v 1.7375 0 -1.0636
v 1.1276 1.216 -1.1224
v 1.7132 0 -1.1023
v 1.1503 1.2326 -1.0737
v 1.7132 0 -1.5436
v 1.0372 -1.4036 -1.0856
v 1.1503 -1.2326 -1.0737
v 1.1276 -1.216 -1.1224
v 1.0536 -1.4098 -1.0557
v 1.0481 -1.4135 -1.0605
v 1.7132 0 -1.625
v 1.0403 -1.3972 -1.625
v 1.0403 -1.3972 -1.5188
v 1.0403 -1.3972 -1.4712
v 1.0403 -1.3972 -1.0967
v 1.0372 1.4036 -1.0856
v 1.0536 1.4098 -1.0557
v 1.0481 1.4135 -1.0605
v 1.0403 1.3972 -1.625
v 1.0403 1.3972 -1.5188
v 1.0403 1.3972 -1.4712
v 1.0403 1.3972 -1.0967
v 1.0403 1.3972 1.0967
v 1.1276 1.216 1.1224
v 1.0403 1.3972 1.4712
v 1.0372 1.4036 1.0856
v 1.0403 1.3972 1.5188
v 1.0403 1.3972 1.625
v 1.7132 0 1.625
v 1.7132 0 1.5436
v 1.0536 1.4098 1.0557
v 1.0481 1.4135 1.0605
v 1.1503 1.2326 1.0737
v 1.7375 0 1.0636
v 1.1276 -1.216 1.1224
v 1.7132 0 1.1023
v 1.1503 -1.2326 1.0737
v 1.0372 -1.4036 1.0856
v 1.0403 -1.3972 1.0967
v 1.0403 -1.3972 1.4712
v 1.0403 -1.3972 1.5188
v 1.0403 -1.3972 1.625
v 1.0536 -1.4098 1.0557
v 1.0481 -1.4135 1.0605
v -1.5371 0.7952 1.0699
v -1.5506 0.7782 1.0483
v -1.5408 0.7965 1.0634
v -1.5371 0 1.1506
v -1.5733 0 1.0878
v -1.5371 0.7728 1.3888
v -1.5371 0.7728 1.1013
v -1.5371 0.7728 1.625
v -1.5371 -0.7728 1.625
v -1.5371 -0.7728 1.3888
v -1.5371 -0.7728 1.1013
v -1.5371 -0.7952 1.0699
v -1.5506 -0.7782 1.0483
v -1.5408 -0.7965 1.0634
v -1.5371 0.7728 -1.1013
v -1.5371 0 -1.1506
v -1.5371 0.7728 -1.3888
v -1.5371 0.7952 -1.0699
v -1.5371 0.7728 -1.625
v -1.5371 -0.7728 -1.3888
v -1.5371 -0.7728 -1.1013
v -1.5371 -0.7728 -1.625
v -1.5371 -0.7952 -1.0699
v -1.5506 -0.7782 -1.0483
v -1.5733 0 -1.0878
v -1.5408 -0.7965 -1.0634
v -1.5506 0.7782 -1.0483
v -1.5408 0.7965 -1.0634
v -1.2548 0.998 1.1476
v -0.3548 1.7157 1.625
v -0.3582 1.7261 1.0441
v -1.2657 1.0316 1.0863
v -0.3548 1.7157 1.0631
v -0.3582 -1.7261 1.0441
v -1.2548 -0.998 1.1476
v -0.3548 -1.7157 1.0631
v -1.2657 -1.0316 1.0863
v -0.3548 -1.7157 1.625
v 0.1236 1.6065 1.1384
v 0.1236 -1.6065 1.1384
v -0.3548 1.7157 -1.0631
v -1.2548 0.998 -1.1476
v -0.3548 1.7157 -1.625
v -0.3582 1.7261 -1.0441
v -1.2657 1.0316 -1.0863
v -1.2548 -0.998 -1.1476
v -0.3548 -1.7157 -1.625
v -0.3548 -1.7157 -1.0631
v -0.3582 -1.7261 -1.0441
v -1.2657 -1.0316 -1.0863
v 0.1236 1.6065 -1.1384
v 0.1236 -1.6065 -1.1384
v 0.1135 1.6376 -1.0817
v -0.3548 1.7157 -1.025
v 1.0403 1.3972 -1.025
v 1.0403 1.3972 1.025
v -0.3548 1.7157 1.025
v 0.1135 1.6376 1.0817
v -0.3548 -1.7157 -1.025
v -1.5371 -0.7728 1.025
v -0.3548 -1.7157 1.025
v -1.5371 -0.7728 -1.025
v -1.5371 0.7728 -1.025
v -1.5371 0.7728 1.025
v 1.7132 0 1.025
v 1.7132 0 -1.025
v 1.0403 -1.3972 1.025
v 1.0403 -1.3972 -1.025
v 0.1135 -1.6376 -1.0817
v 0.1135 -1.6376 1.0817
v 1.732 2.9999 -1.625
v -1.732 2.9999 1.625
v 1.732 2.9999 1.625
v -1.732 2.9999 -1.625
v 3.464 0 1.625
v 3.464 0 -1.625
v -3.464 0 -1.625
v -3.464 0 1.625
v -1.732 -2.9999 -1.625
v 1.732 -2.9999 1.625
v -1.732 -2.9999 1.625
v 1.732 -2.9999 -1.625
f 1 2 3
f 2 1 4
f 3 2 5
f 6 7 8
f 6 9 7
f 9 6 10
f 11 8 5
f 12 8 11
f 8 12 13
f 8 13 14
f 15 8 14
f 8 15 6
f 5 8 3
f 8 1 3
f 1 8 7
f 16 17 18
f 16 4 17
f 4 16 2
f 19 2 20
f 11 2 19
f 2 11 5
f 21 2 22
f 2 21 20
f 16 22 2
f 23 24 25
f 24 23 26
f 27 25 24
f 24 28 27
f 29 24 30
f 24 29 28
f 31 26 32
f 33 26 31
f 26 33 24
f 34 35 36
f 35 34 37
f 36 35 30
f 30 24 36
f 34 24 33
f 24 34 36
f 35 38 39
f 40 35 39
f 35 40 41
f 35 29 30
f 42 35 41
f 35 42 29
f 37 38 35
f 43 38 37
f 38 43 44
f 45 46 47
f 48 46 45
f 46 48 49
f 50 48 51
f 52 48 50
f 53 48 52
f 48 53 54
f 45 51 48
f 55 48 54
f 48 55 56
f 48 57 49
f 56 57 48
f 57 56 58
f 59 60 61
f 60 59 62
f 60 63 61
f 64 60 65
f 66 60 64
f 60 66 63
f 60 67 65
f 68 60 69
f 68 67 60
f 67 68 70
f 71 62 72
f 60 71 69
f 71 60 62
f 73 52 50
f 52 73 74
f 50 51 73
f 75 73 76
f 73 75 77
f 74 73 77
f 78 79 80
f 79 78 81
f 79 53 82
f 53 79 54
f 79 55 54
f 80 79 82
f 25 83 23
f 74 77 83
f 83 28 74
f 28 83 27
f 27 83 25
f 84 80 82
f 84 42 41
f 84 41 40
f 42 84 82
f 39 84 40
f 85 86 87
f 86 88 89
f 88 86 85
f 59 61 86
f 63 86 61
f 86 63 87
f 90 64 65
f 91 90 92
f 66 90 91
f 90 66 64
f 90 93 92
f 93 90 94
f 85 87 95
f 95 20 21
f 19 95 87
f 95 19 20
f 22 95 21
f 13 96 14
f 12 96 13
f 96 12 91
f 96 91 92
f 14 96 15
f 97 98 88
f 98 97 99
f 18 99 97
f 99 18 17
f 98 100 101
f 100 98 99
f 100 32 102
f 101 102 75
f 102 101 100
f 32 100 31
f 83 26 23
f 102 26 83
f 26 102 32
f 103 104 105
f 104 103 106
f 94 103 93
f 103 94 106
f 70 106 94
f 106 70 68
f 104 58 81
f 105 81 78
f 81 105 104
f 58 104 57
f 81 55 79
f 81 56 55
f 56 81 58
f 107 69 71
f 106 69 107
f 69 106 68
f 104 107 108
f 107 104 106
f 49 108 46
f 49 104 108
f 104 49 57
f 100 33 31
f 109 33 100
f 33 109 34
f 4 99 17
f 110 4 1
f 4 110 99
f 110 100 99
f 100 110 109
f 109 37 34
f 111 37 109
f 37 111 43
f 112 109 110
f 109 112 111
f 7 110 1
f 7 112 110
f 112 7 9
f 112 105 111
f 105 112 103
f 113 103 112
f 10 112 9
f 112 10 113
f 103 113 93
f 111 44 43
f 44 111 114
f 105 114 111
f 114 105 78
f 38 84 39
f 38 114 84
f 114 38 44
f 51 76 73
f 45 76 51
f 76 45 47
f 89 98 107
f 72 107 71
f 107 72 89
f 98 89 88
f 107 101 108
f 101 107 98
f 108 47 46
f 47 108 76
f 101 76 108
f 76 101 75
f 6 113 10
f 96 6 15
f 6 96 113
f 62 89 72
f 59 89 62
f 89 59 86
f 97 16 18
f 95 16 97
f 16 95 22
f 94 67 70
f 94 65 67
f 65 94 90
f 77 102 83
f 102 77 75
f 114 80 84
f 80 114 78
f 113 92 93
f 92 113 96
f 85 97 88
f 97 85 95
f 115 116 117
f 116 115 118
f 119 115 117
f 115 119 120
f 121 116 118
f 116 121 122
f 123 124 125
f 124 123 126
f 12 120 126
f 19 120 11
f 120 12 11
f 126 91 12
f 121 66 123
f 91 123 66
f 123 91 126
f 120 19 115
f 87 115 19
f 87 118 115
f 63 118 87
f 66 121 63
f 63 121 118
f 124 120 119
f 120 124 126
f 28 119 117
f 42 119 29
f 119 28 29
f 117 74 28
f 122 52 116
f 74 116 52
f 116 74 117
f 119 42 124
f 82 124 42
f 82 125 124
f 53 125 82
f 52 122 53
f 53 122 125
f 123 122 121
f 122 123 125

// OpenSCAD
// Parameters
thickness = 3.25; //[1.6:6.5:0.05]
hex_af = 6.0; //[3.0:12.0:0.1]
screw_d = 4.0; //[2.0:8.0:0.1]
hole_clearance_d = 4.3; //[4.0:5.5:0.05]
body_len = 12.0; //[6.0:24.0:0.5]
body_w = 8.0; //[4.0:16.0:0.5]
t_head_w = 8.0; //[4.0:16.0:0.5]
t_neck_w = 5.0; //[2.5:10.0:0.5]
t_head_len = 12.0; //[6.0:24.0:0.5]
t_neck_len = 8.0; //[4.0:16.0:0.5]
chamfer = 0.3; //[0.1:1.0:0.05]
overlap = 0.8; //[0.5:2.0:0.1]
hex_R = 3.464; //[1.732:6.928:0.001]
serration_depth = 0.3; //[0.1:0.8:0.05]
serration_pitch = 1.2; //[0.6:2.4:0.1]
ball_d = 2.0; //[1.0:4.0:0.1]
ball_dimple_depth = 0.6; //[0.2:1.5:0.05]
fillet_r = 0.4; //[0.2:1.2:0.05]

// Hex profile across flats
module hex_profile_across_flats() {
  linear_extrude(height=thickness, center=true) {
    polygon(points=[
      [hex_R, 0],
      [hex_R/2, hex_R*sqrt(3)/2],
      [-hex_R/2, hex_R*sqrt(3)/2],
      [-hex_R, 0],
      [-hex_R/2, -hex_R*sqrt(3)/2],
      [hex_R/2, -hex_R*sqrt(3)/2]
    ]);
  }
}

// T-nut head block
module t_nut_head_block() {
  cube([t_head_len, t_head_w, thickness], center=true);
}

// T-nut neck block
module t_nut_neck_block() {
  cube([t_neck_len, t_neck_w, thickness], center=true);
}

// Central screw hole
module central_screw_hole() {
  cylinder(r=hole_clearance_d/2, h=thickness + 2*overlap, center=true);
}

// Lead-in chamfer cutter
module lead_in_chamfer_cutter_top() {
  translate([0, 0, thickness/2 - chamfer])
    cylinder(r1=hole_clearance_d/2 + chamfer, r2=0, h=2*chamfer, center=true);
}

module lead_in_chamfer_cutter_bottom() {
  translate([0, 0, -thickness/2 + chamfer])
    rotate([180, 0, 0])
    cylinder(r1=hole_clearance_d/2 + chamfer, r2=0, h=2*chamfer, center=true);
}

// Serration notch unit
module serration_notch_unit() {
  cube([serration_pitch/2, serration_depth, thickness + 2*overlap], center=true);
}

// Spring ball dimple cutter
module spring_ball_dimple_cutter() {
  translate([t_head_len/2 - ball_d/2, 0, thickness/2 - ball_dimple_depth])
    sphere(r=ball_d/2, center=true);
}

// Engraved size marking
module engraved_size_marking() {
  translate([0, 0, thickness/2 - chamfer/2])
    cube([hex_af/2, hex_af/4, chamfer], center=true);
}

// Edge fillet sphere
module edge_fillet_sphere() {
  sphere(r=fillet_r, center=true);
}

// Assemble T-nut
module t_nut_main_body() {
  difference() {
    intersection() {
      minkowski() {
        difference() {
          difference() {
            difference() {
              difference() {
                intersection() {
                  union() {
                    t_nut_head_block();
                    t_nut_neck_block();
                  }
                  hex_profile_across_flats();
                }
                spring_ball_dimple_cutter();
              }
              central_screw_hole();
              union() {
                lead_in_chamfer_cutter_top();
                lead_in_chamfer_cutter_bottom();
              }
            }
            union() {
              for (i = [1:5]) {
                translate([-t_head_len/2 + serration_pitch*i, t_head_w/2 - serration_depth/2, 0])
                  serration_notch_unit();
                translate([-t_head_len/2 + serration_pitch*i, -t_head_w/2 + serration_depth/2, 0])
                  serration_notch_unit();
              }
            }
          }
          engraved_size_marking();
        }
        edge_fillet_sphere();
      }
      hex_profile_across_flats();
    }
  }
}

// Final output
t_nut_main_body();
